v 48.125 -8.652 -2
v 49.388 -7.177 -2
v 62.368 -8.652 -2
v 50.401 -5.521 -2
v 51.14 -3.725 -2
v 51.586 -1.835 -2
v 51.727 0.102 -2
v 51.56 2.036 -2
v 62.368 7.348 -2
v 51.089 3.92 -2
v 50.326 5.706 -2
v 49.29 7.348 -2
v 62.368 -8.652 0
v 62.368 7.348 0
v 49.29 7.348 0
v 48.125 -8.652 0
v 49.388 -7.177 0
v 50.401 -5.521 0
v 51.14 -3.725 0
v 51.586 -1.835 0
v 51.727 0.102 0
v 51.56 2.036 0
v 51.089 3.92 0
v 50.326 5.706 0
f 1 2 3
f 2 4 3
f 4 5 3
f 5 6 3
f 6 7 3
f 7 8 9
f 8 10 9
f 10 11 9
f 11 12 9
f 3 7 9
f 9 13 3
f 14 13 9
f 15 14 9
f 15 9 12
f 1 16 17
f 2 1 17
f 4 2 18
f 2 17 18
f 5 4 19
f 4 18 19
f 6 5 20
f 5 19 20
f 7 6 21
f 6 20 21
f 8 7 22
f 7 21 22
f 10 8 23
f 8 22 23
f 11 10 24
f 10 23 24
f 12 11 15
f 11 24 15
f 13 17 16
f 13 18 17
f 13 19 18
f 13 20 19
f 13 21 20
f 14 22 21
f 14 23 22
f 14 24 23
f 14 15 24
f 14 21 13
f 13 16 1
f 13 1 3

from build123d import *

# Parameters (mm, degrees)
DODANIE_WYCI_GNI_CIE1_DEPTH = 2
SZKIC2_W                    = 5
SZKIC2_H                    = 16
WYTNIJ_WYCI_GNI_CIE1_DEPTH  = 5
WYTNIJ_WYCI_GNI_CIE2_DEPTH  = 10


with BuildPart() as part:
    # Szkic1 → Dodanie-wyciągnięcie1 (new body)
    with BuildSketch(Plane.XY):
        Polygon((39.660703644, 7.348041155), (39.998203889, -8.651958845), (67.367690874, -8.651958845), (67.367690874, 7.348041155), align=None)
    extrude(amount=-DODANIE_WYCI_GNI_CIE1_DEPTH)

    # Szkic2 → Wytnij-wyciągnięcie1 (cut)
    with BuildSketch(Plane.XY):
        with Locations((64.867690874, -0.651958845)):
            Rectangle(SZKIC2_W, SZKIC2_H)
    extrude(amount=-WYTNIJ_WYCI_GNI_CIE1_DEPTH, mode=Mode.SUBTRACT)

    # Szkic3 → Wytnij-wyciągnięcie2 (cut)
    with BuildSketch(Plane.XY):
        with BuildLine():
            Line((39.660703644, 7.348041155), (39.998203889, -8.651958845))
            Line((39.998203889, -8.651958845), (48.125210145, -8.651958845))
            ThreePointArc((48.125210145, -8.651958845), (51.694710699, -0.869414217), (49.289973229, 7.348041155))
            Line((49.289973229, 7.348041155), (39.660703644, 7.348041155))
        make_face()
    extrude(amount=-WYTNIJ_WYCI_GNI_CIE2_DEPTH, mode=Mode.SUBTRACT)


solid = part.part
